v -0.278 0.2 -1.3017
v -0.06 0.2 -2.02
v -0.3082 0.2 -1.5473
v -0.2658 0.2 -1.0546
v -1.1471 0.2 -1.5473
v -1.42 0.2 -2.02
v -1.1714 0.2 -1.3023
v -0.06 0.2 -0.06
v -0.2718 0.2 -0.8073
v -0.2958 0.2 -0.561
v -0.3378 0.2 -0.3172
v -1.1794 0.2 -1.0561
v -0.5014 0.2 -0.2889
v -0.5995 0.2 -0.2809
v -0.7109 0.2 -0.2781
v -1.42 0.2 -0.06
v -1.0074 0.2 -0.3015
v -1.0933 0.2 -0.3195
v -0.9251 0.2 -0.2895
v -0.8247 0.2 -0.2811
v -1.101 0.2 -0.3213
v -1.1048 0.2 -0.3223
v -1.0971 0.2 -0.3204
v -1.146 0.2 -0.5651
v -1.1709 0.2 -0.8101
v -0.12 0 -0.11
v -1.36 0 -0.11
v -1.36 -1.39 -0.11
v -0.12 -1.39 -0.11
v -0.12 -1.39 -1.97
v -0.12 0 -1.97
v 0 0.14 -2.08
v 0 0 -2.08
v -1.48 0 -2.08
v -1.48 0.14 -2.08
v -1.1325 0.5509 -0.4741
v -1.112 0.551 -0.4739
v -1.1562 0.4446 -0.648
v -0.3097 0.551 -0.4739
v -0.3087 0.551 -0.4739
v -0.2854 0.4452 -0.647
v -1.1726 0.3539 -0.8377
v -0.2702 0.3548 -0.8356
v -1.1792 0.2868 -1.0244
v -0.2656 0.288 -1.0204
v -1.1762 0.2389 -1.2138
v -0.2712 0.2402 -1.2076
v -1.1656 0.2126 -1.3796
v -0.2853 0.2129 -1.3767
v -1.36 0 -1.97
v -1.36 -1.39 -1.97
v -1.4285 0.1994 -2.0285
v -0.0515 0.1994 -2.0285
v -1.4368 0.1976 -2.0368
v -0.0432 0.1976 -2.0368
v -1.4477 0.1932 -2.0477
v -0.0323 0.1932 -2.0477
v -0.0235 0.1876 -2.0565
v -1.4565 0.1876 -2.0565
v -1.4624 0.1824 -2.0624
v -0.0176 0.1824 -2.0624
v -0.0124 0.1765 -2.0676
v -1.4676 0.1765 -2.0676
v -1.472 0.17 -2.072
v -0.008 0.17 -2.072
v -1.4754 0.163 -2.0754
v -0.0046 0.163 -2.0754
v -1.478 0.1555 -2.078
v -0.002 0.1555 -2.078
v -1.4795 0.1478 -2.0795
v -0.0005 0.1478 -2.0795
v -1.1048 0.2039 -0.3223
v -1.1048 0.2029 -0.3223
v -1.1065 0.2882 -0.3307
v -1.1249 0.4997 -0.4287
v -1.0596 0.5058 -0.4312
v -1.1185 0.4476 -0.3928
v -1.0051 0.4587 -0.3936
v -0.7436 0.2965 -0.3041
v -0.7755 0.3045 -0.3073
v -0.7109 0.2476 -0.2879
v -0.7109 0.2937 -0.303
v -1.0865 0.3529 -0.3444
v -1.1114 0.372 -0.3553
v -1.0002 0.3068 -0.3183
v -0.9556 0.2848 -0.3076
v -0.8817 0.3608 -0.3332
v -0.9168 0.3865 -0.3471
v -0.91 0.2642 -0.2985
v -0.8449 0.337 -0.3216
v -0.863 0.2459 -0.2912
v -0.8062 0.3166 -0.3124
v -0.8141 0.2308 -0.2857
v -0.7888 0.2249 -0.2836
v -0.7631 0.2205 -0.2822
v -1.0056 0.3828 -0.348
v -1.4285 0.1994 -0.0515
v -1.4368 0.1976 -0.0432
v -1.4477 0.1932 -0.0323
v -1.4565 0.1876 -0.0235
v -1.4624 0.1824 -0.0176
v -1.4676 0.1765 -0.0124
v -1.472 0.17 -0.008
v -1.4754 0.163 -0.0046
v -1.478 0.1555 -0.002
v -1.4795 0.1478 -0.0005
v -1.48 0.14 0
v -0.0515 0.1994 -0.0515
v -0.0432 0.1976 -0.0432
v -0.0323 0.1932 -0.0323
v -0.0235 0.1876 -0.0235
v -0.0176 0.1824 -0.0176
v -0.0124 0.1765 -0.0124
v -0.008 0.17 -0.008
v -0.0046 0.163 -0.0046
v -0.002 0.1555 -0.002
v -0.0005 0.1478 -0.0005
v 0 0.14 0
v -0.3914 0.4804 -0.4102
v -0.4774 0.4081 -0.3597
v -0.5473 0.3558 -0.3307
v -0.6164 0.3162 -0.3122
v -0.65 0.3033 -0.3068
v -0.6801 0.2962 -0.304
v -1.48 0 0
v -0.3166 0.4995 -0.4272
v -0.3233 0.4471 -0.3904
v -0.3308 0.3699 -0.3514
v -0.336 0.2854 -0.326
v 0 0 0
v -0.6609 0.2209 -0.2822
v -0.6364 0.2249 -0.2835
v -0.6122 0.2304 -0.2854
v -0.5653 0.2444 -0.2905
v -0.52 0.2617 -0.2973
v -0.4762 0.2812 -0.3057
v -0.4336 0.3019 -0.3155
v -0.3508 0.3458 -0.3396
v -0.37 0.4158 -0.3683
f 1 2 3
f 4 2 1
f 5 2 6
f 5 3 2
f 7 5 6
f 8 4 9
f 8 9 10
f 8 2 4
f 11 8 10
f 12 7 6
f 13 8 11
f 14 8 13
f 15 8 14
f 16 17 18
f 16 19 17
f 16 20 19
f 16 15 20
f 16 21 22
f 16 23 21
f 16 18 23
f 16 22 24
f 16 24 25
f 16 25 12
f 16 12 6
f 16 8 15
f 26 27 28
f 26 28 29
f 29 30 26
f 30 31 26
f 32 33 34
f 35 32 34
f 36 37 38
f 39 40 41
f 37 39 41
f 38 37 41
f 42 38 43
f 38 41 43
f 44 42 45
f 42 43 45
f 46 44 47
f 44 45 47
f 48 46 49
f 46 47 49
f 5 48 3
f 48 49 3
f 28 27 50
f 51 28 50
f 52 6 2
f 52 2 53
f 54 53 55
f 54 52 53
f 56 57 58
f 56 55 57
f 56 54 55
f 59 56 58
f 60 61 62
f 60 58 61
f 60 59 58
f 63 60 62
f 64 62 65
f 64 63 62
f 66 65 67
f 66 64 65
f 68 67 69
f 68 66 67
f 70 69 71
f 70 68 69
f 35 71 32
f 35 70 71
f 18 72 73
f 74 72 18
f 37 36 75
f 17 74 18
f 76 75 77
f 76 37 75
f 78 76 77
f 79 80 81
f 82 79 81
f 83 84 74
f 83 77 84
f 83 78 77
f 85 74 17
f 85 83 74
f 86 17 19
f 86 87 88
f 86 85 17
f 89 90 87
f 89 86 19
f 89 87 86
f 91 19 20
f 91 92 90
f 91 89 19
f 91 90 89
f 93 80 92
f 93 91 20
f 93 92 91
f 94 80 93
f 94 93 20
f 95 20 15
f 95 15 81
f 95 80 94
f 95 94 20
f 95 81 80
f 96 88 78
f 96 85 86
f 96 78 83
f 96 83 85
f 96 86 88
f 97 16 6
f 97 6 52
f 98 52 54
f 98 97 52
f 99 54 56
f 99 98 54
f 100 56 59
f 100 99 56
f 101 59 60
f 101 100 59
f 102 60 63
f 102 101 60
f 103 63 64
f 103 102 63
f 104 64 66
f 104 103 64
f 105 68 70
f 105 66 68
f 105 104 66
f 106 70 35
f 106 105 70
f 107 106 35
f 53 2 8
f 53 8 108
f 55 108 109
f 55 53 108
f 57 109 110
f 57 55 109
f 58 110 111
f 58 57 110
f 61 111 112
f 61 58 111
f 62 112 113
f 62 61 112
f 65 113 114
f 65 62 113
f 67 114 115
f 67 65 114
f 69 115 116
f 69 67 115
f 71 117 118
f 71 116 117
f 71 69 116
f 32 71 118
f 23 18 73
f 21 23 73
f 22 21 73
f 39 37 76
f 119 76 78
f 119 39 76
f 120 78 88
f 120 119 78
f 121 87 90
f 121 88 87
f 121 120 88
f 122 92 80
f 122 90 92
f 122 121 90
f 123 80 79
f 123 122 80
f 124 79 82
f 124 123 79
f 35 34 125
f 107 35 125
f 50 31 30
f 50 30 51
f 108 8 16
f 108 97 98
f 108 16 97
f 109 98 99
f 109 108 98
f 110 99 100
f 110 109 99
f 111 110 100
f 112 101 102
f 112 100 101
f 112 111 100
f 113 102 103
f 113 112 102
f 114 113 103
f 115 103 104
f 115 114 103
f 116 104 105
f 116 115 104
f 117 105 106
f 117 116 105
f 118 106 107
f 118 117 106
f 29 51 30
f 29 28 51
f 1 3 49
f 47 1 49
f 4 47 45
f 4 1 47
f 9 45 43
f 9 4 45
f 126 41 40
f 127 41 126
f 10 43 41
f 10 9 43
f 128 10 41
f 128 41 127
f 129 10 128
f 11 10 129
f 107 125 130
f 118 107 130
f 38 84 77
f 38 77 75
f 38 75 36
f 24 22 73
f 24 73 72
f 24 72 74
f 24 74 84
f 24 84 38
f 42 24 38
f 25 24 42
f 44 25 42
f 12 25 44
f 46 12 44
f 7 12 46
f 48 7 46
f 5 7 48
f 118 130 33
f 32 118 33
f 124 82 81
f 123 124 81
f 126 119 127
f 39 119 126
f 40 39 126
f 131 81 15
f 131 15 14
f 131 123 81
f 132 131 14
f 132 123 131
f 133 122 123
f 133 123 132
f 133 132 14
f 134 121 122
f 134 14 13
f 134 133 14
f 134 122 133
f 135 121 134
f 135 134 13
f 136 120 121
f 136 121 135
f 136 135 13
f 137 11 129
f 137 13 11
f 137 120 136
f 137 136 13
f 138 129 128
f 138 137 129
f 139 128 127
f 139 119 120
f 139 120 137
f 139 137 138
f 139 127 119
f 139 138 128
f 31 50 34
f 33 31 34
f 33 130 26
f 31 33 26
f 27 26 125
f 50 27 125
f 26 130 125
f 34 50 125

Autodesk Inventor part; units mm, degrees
ref_plane "YZ Plane" through (0, 0, 0) normal (1, 0, 0) x (0, 1, 0)
ref_plane "XZ Plane" through (0, 0, 0) normal (0, 1, 0) x (-1, 0, 0)
ref_plane "XY Plane" through (0, 0, 0) normal (0, 0, 1) x (1, 0, 0)
sketch "Boceto1" plane through (0, 0, 0) normal (0, 1, 0) x (-1, 0, 0)
  line L0 (0, 0) -> (0, -2.08)
  line L1 (0, -2.08) -> (1.48, -2.08)
  line L2 (1.48, -2.08) -> (1.48, 0)
  line L3 (1.48, 0) -> (0, 0)
  dimension "d0" = 2.08
  dimension "d1" = 1.48
extrude "Extrusión1" add sketch "Boceto1" along normal blind 0.2
fillet "Empalme1" radius 0.06 4 edges at (0, 0.2, -1.04) (-0.74, 0.2, -2.08) (-1.48, 0.2, -1.04) (-0.74, 0.2, 0)
sketch "Boceto2" plane through (0, 0.2, 0) normal (0, 1, 0) x (1, 0, 0)
  line L0 (-1.48, 2.08) -> (-1.48, 0) projected
  line L1 (0, 2.08) -> (-1.48, 2.08) projected
  line L2 (-1.48, 0) -> (0, 0) projected
  line L3 (0, 2.08) -> (0, 0)
  arc A0 (-0.3478, 1.7532) -> (-1.1148, 1.7481) centre (-0.7208, 0.1817) ccw
  arc A1 (-1.1148, 1.7481) -> (-1.1048, 0.3223) centre (2.5123, 1.0607) ccw
  line L4 (0, 0) -> (-1.48, 0)
  arc A2 (-1.1048, 0.3223) -> (-0.3378, 0.3172) centre (-0.7108, 1.8887) ccw
  arc A3 (-0.3378, 0.3172) -> (-0.3478, 1.7532) centre (-3.6438, 1.0121) ccw
extrude "Extrusión2" add sketch "Boceto2" along normal blind 0.4 contours A3 A2 A1 A0
sketch "Boceto3" plane through (0, 0, 0) normal (1, 0, 0) x (0, 1, 0)
  line L0 (0.2, 0.051) -> (0.2, -2.029)
  arc A0 (0.551, -0.4739) -> (0.2, -0.2735) centre (0.0286, -0.9813) ccw
  arc A1 (0.551, -0.4739) -> (0.2, -1.5473) centre (2.2219, -1.6144) ccw
  line L1 (0.2, -2.02) -> (0.2, -0.06) projected
  line L2 (0.2, -0.2735) -> (0.6, -0.2735) projected
  line L3 (0.2, 0.051) -> (0.9906, 0.051)
  line L4 (0.9906, 0.051) -> (0.9906, -2.1784)
  line L5 (0.9906, -2.1784) -> (0.2, -2.1784)
  line L6 (0.2, -2.1784) -> (0.2, -1.5473)
  arc A2 (0.551, -0.4739) -> (0.2, -1.5473) centre (2.2219, -1.6144) ccw
  arc A3 (0.551, -0.4739) -> (0.2, -0.2735) centre (0.0286, -0.9813) ccw
  line L7 (0.2, -0.2735) -> (0.2, 0.051)
  point P0 (0, 0)
extrude "Extrusión3" cut sketch "Boceto3" against normal blind 4 contours L3 L4 L5 L6 L0 A1 A0
fillet "Empalme2" radius 0.43 2 edges at (-0.9202, 0.2488, -0.2871) (-0.5128, 0.2442, -0.2857)
sketch "Boceto4" plane through (0, 0, 0) normal (0, -1, 0) x (1, 0, 0)
  line L0 (0, 0) -> (0, -2.08) projected
  line L1 (-1.48, 0) -> (0, 0) projected
  line L2 (-1.48, -2.08) -> (-1.48, 0) projected
  line L3 (0, -2.08) -> (-1.48, -2.08) projected
  line L4 (0, 0) -> (0, -2.08) projected
  line L5 (-0.12, -1.97) -> (-1.36, -1.97)
  line L6 (-1.36, -0.11) -> (-1.36, -1.97)
  line L7 (-0.12, -1.97) -> (-0.12, -0.11)
  line L8 (-1.36, -0.11) -> (-0.12, -0.11)
extrude "Extrusión4" add sketch "Boceto4" along normal blind 1.39 contours L5 L6 L8 L7
properties part number "interruptor"
